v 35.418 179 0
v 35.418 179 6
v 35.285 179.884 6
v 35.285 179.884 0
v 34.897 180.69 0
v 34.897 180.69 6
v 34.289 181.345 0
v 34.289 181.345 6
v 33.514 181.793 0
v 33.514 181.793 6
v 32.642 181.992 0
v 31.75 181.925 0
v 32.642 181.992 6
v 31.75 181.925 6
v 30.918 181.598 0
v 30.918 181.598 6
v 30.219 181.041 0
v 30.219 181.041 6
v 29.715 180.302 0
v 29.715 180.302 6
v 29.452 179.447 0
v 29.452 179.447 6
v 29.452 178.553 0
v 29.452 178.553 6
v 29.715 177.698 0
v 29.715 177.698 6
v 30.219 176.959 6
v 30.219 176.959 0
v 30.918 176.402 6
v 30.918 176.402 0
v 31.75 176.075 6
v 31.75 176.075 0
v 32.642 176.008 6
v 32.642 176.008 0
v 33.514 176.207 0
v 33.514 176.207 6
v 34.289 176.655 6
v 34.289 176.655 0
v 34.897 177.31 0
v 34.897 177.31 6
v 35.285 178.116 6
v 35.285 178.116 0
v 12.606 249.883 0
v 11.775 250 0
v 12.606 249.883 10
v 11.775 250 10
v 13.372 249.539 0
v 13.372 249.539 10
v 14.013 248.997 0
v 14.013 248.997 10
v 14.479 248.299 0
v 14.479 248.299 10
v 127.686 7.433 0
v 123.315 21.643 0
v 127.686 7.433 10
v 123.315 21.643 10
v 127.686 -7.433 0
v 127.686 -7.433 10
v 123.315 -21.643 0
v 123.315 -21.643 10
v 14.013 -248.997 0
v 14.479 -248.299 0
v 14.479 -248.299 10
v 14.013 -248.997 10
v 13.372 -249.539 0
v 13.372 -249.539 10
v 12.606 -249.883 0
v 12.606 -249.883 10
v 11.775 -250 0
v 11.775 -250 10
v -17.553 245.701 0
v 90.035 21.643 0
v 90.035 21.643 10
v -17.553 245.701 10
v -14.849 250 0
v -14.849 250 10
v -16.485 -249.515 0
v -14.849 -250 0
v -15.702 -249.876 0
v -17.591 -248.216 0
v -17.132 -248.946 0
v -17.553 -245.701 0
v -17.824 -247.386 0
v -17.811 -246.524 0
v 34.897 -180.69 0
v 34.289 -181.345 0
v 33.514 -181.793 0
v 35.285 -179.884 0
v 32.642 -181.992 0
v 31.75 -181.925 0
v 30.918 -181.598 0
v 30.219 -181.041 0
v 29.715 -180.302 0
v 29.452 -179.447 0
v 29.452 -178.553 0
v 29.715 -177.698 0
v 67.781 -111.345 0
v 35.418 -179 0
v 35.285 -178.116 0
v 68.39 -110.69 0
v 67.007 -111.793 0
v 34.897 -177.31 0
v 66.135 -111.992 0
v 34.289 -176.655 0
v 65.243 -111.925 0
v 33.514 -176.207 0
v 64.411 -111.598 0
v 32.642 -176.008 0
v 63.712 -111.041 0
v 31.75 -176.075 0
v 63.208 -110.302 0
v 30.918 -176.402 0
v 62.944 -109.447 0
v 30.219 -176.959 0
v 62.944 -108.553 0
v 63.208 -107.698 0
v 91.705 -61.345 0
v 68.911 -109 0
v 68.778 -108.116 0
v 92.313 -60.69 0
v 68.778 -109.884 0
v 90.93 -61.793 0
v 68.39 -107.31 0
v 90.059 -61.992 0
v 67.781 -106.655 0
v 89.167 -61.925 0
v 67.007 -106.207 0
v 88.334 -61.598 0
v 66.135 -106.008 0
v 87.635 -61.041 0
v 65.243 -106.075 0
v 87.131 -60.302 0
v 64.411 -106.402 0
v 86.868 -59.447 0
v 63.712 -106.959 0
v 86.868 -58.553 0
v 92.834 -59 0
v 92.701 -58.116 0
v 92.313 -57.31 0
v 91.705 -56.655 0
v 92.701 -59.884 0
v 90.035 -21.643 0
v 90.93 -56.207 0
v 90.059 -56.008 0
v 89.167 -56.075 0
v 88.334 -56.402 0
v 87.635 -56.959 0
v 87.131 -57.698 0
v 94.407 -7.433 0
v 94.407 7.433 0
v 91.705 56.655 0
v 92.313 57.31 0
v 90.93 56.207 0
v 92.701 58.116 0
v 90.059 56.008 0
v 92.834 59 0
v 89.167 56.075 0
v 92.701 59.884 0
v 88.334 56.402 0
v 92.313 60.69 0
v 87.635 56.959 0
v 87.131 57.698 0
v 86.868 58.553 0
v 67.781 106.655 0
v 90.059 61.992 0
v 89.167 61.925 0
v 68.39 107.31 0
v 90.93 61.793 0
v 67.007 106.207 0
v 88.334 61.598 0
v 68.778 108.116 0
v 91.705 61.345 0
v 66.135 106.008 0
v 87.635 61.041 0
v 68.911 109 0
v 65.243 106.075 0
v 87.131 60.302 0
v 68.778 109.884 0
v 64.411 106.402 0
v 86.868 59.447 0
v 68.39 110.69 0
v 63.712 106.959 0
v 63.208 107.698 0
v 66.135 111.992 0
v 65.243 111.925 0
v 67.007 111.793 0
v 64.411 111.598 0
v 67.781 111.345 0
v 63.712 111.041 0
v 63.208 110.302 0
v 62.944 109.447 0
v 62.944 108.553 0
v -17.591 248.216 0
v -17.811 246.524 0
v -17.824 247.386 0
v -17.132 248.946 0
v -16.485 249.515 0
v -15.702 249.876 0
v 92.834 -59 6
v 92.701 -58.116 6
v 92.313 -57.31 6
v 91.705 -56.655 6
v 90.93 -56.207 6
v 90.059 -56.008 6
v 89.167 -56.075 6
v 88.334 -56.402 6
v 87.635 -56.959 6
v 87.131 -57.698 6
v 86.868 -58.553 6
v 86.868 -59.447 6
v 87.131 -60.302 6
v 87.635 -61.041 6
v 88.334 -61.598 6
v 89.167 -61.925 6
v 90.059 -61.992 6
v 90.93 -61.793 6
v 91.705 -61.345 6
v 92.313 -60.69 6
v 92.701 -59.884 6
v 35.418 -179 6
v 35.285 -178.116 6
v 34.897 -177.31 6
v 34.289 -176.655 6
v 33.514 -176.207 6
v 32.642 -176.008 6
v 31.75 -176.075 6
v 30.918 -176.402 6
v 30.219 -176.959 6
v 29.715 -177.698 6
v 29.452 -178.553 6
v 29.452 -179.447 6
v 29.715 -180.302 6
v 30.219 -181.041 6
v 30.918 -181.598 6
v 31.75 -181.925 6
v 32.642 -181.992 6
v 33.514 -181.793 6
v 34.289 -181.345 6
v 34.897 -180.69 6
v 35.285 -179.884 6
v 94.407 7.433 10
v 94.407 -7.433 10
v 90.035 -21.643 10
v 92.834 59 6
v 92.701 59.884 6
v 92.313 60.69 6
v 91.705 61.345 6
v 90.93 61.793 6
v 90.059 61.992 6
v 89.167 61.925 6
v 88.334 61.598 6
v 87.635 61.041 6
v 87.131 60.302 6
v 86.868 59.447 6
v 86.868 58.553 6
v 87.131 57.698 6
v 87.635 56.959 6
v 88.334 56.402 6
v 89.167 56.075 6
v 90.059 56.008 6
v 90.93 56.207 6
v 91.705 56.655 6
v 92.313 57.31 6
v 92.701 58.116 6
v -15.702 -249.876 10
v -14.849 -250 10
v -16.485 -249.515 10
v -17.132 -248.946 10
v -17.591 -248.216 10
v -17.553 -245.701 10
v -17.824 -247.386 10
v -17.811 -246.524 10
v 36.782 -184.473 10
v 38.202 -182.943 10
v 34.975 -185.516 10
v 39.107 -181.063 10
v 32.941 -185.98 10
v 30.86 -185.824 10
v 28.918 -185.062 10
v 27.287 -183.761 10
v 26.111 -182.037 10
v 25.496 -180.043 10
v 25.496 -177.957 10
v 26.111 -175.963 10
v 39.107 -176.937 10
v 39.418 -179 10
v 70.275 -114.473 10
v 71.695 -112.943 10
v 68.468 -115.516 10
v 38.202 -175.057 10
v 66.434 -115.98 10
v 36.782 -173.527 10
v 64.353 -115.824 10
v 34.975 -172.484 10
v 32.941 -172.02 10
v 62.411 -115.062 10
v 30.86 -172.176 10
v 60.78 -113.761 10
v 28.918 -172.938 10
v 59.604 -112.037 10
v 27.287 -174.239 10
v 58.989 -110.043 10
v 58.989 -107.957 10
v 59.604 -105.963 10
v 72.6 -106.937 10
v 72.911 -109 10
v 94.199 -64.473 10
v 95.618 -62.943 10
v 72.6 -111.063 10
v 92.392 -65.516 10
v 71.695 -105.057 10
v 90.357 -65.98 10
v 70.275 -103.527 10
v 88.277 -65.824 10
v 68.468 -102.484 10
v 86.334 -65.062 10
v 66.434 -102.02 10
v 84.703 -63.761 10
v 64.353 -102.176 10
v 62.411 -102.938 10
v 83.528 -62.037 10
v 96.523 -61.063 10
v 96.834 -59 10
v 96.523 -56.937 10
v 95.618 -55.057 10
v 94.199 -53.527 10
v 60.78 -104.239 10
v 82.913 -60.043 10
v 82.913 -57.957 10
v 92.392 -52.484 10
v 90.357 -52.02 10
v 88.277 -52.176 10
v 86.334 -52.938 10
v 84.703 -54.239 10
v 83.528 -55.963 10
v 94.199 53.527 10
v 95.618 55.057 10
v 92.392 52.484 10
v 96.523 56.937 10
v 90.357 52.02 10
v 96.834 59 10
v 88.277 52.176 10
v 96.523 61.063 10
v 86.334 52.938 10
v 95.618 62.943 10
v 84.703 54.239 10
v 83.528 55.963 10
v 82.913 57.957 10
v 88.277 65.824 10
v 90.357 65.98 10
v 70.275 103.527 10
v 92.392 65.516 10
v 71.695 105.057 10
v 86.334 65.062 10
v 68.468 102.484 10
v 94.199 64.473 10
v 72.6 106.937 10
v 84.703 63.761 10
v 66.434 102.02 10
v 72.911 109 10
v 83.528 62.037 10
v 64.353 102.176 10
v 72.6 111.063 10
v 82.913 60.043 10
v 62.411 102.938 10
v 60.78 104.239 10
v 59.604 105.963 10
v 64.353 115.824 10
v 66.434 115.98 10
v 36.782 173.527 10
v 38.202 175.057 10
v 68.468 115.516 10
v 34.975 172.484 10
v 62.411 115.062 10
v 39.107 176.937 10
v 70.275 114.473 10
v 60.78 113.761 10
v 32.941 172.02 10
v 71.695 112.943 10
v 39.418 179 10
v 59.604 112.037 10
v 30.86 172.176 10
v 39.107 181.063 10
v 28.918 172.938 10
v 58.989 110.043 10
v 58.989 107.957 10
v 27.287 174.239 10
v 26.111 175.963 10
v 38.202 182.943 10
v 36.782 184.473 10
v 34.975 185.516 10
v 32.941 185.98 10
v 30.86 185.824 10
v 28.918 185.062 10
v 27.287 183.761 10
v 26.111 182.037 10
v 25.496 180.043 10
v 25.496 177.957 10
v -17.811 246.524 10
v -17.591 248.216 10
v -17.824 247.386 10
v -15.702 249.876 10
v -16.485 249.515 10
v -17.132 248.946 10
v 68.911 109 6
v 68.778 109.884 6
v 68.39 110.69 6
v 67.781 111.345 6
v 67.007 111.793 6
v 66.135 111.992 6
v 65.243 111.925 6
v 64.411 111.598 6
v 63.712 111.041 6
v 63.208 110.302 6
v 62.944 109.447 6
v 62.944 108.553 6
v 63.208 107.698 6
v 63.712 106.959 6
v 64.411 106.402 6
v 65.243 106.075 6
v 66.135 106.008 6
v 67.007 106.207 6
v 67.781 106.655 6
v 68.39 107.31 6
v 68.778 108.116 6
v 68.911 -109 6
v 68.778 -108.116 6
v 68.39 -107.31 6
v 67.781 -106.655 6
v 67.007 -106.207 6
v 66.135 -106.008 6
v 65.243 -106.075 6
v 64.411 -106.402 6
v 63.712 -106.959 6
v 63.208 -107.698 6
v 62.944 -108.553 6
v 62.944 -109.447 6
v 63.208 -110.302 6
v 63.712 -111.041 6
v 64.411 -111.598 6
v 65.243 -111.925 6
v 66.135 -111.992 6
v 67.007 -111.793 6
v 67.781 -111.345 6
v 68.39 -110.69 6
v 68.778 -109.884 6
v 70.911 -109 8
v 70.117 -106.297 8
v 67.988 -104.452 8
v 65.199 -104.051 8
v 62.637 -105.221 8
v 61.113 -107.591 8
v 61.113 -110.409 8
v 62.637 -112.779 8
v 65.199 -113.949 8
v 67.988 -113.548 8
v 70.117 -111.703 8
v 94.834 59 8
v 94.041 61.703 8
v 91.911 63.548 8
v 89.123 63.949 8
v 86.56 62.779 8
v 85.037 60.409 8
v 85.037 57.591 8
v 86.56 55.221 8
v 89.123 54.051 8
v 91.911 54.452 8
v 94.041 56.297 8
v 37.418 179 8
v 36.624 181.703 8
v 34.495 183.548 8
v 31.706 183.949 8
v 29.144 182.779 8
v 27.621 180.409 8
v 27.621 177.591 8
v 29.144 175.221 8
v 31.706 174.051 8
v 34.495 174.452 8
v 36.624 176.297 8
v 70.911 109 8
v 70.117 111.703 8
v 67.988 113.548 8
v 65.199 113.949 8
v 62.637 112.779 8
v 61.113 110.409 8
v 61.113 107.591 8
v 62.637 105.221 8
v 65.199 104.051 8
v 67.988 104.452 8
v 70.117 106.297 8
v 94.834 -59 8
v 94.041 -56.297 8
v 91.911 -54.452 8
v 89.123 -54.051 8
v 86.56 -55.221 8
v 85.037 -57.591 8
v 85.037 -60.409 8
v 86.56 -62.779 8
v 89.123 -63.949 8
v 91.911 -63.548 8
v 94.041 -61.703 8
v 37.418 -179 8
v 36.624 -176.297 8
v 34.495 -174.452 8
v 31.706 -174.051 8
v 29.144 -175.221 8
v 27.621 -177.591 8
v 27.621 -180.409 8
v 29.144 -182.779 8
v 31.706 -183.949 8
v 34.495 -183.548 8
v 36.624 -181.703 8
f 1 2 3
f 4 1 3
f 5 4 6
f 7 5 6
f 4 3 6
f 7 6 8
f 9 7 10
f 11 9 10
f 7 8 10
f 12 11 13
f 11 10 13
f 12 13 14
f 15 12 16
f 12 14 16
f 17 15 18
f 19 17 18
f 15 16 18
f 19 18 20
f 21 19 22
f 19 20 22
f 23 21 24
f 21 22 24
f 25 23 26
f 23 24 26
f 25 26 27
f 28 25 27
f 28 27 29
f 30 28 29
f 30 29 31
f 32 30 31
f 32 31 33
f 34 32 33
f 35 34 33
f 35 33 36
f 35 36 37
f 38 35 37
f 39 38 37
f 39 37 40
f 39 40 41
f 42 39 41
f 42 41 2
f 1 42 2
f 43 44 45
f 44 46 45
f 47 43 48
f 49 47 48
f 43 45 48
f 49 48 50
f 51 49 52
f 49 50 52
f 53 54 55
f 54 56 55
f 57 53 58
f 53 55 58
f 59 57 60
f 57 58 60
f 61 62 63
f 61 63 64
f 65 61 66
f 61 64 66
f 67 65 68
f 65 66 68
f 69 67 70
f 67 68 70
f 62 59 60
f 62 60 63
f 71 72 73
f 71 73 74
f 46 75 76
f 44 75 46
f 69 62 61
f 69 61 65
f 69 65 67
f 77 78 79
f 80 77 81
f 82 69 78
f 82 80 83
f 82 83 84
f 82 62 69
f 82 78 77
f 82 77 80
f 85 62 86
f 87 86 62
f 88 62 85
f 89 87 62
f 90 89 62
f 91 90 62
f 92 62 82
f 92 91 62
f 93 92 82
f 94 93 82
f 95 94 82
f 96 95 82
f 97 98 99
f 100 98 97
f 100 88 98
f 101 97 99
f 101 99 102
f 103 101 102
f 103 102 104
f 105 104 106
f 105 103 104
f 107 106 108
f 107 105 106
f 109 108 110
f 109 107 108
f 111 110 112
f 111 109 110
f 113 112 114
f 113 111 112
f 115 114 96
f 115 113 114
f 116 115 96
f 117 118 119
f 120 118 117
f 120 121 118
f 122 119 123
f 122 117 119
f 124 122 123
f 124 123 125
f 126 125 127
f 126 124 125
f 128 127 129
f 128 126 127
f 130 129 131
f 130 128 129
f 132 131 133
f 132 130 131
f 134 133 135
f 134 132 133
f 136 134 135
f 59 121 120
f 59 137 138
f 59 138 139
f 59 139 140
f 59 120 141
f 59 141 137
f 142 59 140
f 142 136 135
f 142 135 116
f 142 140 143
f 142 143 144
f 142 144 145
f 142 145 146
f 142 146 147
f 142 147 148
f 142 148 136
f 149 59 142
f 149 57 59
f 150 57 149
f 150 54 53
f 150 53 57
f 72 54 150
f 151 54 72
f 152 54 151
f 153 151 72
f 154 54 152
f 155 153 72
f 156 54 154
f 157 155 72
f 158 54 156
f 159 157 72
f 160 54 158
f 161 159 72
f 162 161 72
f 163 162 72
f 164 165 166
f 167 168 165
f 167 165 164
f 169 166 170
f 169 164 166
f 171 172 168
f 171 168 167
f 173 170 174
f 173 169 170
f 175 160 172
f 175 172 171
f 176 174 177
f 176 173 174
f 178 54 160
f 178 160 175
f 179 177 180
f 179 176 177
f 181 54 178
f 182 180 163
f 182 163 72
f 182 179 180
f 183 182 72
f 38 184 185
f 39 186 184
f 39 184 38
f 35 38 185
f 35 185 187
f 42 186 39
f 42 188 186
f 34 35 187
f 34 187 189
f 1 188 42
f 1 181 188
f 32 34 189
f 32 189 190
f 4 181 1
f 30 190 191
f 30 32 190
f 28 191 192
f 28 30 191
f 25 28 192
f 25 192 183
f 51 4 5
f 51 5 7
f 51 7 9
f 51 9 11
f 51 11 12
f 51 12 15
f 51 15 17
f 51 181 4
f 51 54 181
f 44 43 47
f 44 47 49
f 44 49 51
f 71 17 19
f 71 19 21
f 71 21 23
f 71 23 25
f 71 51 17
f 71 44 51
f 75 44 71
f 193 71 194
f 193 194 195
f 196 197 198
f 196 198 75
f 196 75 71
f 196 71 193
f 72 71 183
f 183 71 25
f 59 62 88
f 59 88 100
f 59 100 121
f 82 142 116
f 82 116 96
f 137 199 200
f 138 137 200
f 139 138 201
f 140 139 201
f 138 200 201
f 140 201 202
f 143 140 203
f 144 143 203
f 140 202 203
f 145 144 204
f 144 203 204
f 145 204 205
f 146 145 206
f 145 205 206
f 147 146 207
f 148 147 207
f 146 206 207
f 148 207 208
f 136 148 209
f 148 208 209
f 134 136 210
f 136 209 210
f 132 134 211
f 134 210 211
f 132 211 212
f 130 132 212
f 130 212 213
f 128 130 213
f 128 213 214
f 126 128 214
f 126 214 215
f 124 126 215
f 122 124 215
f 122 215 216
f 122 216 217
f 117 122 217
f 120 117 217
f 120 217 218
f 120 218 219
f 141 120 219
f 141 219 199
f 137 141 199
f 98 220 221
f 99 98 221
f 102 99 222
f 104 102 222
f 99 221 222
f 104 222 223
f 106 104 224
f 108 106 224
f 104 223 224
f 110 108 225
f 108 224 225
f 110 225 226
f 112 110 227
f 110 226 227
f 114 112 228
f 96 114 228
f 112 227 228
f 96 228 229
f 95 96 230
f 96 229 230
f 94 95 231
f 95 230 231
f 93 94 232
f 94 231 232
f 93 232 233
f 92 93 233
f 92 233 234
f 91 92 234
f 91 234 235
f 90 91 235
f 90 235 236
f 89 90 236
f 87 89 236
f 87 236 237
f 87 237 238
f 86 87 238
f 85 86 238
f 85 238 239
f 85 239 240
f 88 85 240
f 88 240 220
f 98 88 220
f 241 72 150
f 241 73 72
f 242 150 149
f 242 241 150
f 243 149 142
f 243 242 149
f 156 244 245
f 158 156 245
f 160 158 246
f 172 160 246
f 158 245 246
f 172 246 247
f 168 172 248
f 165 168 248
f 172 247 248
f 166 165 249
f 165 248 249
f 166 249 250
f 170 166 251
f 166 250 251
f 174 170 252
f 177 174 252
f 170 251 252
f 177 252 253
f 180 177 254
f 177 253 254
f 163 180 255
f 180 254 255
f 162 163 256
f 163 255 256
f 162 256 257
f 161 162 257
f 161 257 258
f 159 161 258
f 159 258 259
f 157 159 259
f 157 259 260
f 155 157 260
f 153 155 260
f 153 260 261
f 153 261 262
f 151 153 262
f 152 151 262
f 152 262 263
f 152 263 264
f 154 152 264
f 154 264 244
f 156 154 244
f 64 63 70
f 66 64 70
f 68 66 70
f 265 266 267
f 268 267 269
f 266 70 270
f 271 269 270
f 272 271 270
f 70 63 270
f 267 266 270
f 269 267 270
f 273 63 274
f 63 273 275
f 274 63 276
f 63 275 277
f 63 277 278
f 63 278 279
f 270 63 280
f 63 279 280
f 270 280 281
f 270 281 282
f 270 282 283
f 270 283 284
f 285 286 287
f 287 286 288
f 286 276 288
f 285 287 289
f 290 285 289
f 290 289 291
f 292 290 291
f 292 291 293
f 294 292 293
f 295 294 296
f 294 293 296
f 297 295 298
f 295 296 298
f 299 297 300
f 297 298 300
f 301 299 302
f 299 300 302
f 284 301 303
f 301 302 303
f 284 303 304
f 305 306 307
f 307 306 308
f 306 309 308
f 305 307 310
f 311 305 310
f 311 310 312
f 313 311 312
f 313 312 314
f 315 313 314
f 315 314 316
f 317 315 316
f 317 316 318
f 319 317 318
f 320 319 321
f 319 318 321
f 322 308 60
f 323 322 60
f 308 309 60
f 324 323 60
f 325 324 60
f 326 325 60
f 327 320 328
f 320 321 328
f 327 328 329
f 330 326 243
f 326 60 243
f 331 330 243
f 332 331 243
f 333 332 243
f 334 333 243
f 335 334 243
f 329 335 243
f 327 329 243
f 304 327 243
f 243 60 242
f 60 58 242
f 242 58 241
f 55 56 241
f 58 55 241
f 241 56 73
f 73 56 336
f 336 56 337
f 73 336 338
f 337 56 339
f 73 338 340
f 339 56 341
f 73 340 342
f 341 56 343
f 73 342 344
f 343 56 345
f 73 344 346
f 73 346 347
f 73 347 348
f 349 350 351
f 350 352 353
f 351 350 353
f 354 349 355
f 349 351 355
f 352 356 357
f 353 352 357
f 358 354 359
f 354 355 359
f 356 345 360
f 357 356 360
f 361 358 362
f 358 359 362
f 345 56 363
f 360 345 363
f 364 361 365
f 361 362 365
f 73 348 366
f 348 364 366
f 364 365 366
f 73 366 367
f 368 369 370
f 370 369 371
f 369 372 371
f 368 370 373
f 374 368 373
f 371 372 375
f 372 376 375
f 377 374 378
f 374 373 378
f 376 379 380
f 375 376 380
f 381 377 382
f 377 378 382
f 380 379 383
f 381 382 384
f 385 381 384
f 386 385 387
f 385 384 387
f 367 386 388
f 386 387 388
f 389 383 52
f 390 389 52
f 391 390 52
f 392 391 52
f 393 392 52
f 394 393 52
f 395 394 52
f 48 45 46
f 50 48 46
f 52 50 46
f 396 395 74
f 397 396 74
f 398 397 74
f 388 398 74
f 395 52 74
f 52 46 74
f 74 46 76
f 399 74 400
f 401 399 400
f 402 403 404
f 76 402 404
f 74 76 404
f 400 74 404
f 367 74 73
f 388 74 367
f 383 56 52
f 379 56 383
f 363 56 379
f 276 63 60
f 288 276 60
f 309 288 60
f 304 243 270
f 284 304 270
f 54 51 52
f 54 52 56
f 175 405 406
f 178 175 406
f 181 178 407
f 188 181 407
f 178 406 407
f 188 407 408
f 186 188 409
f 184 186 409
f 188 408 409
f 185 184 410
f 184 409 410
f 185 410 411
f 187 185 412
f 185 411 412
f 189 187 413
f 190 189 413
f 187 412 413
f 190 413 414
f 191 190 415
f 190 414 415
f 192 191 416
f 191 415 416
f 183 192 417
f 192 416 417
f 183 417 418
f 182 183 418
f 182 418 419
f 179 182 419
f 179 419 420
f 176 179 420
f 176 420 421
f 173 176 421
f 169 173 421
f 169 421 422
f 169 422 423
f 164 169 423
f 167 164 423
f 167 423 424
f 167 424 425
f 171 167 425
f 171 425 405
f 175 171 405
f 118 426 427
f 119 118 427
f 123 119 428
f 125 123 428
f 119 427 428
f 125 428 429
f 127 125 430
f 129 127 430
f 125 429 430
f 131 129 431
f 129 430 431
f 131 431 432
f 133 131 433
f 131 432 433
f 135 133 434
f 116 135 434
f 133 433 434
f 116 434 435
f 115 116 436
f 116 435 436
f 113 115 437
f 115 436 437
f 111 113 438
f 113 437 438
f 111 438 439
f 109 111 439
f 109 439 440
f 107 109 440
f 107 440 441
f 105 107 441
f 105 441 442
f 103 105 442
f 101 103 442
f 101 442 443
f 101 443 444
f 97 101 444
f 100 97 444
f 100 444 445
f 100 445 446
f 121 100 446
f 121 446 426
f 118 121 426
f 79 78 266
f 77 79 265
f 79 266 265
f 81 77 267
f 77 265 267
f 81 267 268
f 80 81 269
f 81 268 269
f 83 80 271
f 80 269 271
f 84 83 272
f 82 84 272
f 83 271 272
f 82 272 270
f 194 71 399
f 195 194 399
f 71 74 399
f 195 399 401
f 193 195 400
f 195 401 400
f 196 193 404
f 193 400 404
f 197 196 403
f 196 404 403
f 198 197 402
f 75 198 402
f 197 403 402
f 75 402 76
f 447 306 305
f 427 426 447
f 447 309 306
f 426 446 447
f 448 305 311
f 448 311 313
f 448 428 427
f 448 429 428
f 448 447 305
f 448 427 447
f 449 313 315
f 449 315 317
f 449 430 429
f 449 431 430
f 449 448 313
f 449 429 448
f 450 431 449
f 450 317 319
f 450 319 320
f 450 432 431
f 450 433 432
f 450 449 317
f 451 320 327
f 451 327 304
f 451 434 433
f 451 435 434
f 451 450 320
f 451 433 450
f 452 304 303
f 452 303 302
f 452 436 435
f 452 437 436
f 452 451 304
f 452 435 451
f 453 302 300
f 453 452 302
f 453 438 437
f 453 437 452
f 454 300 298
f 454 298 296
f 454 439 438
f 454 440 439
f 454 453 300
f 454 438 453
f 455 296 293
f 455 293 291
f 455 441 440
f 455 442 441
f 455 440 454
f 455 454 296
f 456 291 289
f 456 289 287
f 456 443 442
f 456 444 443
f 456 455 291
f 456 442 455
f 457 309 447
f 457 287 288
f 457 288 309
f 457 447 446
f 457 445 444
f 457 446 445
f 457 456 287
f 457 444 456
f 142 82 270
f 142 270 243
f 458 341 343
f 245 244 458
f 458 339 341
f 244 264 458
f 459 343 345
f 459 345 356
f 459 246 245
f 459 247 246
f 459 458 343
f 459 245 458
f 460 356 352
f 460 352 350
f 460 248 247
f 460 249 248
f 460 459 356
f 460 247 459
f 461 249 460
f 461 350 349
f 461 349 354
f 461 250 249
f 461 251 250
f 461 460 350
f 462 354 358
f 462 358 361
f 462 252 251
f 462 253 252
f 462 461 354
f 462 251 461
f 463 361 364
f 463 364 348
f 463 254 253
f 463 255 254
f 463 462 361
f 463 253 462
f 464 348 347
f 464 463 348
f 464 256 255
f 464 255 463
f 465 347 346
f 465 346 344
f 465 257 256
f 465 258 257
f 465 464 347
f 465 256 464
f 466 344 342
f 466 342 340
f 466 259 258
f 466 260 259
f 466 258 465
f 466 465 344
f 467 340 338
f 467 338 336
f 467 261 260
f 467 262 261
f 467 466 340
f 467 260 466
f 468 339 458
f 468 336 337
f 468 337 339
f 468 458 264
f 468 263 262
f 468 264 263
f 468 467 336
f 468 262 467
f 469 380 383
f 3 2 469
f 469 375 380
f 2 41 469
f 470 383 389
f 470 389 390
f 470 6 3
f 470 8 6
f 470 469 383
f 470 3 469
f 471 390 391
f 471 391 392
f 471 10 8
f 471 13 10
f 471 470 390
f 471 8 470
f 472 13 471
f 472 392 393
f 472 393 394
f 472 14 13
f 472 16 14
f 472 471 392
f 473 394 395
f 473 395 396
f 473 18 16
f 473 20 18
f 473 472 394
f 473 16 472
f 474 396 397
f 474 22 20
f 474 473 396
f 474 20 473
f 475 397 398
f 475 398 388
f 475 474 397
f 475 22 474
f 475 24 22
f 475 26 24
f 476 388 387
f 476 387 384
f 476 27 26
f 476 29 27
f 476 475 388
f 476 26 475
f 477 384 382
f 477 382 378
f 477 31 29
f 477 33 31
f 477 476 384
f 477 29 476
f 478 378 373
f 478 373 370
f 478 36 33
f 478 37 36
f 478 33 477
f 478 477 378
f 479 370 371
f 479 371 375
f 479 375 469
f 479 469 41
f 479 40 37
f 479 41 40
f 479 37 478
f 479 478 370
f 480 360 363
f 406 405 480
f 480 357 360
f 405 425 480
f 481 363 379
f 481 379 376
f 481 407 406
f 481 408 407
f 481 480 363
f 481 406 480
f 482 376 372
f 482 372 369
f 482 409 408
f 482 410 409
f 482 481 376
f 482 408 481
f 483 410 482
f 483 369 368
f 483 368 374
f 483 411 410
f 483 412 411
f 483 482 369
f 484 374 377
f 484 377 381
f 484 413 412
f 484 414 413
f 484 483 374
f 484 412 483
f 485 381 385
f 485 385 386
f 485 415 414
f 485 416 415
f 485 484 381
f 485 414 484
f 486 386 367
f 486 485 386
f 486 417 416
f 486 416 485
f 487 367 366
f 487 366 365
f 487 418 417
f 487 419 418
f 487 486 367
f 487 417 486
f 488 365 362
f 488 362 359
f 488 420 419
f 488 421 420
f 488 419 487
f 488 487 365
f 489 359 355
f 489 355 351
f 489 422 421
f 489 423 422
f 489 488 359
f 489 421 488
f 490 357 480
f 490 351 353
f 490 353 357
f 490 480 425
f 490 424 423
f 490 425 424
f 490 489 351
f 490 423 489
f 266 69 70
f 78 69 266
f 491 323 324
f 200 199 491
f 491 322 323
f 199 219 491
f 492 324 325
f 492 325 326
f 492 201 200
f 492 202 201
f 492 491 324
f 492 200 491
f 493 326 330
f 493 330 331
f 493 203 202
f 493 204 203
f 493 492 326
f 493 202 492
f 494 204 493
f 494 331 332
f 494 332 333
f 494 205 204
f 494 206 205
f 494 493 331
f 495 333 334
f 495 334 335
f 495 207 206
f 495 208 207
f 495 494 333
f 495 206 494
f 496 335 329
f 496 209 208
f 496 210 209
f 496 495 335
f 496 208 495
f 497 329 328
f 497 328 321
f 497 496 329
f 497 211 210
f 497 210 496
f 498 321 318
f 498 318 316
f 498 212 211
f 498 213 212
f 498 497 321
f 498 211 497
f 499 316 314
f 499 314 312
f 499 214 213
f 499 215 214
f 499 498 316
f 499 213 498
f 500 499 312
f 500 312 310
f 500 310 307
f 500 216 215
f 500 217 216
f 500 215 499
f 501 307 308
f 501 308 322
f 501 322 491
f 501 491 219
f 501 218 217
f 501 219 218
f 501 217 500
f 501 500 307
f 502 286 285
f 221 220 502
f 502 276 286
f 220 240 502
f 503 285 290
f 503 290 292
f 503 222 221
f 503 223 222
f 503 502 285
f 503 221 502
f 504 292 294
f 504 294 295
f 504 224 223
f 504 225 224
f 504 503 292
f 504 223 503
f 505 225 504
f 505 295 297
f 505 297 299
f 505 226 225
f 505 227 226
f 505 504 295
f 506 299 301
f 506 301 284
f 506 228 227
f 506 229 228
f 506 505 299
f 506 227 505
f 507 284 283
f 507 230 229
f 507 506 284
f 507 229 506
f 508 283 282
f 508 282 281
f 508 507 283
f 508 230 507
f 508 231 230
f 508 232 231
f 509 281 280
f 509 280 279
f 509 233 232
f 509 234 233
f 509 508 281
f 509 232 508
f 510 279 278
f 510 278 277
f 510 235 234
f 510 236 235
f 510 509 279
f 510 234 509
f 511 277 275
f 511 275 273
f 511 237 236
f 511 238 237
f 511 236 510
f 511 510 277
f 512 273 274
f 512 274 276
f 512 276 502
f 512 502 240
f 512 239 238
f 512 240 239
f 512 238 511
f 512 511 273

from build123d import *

# Parameters (mm, degrees)
Y_KSEKLIK_EKSTR_ZYON1_DEPTH = 10
RADYUS1_R                   = 3
RADYUS2_R                   = 50
IZIM2_R                     = 3
KES_EKSTR_ZYON1_DEPTH       = 68
PAH1_SIZE                   = 4


with BuildPart() as part:
    # Çizim1 → Yükseklik-Ekstrüzyon1 (new body)
    with BuildSketch(Plane.XY):
        Polygon((100.428030576, 0), (-19.61722488, 250), (13.66214459, 250), (133.707400046, 0), (13.66214459, -250), (-19.61722488, -250), align=None)
    extrude(amount=Y_KSEKLIK_EKSTR_ZYON1_DEPTH)

    # Radyus1
    radyus1_edges = [part.edges().sort_by_distance(p)[0] for p in [
        (13.66214459, 250, 5),
        (13.66214459, -250, 5),
        (-19.61722488, -250, 5),
        (-19.61722488, 250, 5),
    ]]
    fillet(radyus1_edges, radius=RADYUS1_R)

    # Radyus2
    radyus2_edges = [part.edges().sort_by_distance(p)[0] for p in [
        (133.707400046, 0, 5),
        (100.428030576, 0, 5),
    ]]
    fillet(radyus2_edges, radius=RADYUS2_R)

    # Çizim2 → Kes-Ekstrüzyon1 (cut)
    with BuildSketch(Plane.XY.offset(10)):
        with Locations((32.418057802, -179)):
            Circle(IZIM2_R)
        with Locations((65.910880768, -109)):
            Circle(IZIM2_R)
        with Locations((89.834325744, -59)):
            Circle(IZIM2_R)
        with Locations((65.910880768, 109)):
            Circle(IZIM2_R)
        with Locations((89.834325744, 59)):
            Circle(IZIM2_R)
        with Locations((32.418057802, 179)):
            Circle(IZIM2_R)
    extrude(amount=-KES_EKSTR_ZYON1_DEPTH, mode=Mode.SUBTRACT)

    # Pah1
    pah1_edges = [part.edges().sort_by_distance(p)[0] for p in [
        (29.418057802, -179, 10),
        (62.910880768, -109, 10),
        (86.834325744, -59, 10),
        (62.910880768, 109, 10),
        (86.834325744, 59, 10),
        (29.418057802, 179, 10),
    ]]
    chamfer(pah1_edges, length=PAH1_SIZE)


solid = part.part
